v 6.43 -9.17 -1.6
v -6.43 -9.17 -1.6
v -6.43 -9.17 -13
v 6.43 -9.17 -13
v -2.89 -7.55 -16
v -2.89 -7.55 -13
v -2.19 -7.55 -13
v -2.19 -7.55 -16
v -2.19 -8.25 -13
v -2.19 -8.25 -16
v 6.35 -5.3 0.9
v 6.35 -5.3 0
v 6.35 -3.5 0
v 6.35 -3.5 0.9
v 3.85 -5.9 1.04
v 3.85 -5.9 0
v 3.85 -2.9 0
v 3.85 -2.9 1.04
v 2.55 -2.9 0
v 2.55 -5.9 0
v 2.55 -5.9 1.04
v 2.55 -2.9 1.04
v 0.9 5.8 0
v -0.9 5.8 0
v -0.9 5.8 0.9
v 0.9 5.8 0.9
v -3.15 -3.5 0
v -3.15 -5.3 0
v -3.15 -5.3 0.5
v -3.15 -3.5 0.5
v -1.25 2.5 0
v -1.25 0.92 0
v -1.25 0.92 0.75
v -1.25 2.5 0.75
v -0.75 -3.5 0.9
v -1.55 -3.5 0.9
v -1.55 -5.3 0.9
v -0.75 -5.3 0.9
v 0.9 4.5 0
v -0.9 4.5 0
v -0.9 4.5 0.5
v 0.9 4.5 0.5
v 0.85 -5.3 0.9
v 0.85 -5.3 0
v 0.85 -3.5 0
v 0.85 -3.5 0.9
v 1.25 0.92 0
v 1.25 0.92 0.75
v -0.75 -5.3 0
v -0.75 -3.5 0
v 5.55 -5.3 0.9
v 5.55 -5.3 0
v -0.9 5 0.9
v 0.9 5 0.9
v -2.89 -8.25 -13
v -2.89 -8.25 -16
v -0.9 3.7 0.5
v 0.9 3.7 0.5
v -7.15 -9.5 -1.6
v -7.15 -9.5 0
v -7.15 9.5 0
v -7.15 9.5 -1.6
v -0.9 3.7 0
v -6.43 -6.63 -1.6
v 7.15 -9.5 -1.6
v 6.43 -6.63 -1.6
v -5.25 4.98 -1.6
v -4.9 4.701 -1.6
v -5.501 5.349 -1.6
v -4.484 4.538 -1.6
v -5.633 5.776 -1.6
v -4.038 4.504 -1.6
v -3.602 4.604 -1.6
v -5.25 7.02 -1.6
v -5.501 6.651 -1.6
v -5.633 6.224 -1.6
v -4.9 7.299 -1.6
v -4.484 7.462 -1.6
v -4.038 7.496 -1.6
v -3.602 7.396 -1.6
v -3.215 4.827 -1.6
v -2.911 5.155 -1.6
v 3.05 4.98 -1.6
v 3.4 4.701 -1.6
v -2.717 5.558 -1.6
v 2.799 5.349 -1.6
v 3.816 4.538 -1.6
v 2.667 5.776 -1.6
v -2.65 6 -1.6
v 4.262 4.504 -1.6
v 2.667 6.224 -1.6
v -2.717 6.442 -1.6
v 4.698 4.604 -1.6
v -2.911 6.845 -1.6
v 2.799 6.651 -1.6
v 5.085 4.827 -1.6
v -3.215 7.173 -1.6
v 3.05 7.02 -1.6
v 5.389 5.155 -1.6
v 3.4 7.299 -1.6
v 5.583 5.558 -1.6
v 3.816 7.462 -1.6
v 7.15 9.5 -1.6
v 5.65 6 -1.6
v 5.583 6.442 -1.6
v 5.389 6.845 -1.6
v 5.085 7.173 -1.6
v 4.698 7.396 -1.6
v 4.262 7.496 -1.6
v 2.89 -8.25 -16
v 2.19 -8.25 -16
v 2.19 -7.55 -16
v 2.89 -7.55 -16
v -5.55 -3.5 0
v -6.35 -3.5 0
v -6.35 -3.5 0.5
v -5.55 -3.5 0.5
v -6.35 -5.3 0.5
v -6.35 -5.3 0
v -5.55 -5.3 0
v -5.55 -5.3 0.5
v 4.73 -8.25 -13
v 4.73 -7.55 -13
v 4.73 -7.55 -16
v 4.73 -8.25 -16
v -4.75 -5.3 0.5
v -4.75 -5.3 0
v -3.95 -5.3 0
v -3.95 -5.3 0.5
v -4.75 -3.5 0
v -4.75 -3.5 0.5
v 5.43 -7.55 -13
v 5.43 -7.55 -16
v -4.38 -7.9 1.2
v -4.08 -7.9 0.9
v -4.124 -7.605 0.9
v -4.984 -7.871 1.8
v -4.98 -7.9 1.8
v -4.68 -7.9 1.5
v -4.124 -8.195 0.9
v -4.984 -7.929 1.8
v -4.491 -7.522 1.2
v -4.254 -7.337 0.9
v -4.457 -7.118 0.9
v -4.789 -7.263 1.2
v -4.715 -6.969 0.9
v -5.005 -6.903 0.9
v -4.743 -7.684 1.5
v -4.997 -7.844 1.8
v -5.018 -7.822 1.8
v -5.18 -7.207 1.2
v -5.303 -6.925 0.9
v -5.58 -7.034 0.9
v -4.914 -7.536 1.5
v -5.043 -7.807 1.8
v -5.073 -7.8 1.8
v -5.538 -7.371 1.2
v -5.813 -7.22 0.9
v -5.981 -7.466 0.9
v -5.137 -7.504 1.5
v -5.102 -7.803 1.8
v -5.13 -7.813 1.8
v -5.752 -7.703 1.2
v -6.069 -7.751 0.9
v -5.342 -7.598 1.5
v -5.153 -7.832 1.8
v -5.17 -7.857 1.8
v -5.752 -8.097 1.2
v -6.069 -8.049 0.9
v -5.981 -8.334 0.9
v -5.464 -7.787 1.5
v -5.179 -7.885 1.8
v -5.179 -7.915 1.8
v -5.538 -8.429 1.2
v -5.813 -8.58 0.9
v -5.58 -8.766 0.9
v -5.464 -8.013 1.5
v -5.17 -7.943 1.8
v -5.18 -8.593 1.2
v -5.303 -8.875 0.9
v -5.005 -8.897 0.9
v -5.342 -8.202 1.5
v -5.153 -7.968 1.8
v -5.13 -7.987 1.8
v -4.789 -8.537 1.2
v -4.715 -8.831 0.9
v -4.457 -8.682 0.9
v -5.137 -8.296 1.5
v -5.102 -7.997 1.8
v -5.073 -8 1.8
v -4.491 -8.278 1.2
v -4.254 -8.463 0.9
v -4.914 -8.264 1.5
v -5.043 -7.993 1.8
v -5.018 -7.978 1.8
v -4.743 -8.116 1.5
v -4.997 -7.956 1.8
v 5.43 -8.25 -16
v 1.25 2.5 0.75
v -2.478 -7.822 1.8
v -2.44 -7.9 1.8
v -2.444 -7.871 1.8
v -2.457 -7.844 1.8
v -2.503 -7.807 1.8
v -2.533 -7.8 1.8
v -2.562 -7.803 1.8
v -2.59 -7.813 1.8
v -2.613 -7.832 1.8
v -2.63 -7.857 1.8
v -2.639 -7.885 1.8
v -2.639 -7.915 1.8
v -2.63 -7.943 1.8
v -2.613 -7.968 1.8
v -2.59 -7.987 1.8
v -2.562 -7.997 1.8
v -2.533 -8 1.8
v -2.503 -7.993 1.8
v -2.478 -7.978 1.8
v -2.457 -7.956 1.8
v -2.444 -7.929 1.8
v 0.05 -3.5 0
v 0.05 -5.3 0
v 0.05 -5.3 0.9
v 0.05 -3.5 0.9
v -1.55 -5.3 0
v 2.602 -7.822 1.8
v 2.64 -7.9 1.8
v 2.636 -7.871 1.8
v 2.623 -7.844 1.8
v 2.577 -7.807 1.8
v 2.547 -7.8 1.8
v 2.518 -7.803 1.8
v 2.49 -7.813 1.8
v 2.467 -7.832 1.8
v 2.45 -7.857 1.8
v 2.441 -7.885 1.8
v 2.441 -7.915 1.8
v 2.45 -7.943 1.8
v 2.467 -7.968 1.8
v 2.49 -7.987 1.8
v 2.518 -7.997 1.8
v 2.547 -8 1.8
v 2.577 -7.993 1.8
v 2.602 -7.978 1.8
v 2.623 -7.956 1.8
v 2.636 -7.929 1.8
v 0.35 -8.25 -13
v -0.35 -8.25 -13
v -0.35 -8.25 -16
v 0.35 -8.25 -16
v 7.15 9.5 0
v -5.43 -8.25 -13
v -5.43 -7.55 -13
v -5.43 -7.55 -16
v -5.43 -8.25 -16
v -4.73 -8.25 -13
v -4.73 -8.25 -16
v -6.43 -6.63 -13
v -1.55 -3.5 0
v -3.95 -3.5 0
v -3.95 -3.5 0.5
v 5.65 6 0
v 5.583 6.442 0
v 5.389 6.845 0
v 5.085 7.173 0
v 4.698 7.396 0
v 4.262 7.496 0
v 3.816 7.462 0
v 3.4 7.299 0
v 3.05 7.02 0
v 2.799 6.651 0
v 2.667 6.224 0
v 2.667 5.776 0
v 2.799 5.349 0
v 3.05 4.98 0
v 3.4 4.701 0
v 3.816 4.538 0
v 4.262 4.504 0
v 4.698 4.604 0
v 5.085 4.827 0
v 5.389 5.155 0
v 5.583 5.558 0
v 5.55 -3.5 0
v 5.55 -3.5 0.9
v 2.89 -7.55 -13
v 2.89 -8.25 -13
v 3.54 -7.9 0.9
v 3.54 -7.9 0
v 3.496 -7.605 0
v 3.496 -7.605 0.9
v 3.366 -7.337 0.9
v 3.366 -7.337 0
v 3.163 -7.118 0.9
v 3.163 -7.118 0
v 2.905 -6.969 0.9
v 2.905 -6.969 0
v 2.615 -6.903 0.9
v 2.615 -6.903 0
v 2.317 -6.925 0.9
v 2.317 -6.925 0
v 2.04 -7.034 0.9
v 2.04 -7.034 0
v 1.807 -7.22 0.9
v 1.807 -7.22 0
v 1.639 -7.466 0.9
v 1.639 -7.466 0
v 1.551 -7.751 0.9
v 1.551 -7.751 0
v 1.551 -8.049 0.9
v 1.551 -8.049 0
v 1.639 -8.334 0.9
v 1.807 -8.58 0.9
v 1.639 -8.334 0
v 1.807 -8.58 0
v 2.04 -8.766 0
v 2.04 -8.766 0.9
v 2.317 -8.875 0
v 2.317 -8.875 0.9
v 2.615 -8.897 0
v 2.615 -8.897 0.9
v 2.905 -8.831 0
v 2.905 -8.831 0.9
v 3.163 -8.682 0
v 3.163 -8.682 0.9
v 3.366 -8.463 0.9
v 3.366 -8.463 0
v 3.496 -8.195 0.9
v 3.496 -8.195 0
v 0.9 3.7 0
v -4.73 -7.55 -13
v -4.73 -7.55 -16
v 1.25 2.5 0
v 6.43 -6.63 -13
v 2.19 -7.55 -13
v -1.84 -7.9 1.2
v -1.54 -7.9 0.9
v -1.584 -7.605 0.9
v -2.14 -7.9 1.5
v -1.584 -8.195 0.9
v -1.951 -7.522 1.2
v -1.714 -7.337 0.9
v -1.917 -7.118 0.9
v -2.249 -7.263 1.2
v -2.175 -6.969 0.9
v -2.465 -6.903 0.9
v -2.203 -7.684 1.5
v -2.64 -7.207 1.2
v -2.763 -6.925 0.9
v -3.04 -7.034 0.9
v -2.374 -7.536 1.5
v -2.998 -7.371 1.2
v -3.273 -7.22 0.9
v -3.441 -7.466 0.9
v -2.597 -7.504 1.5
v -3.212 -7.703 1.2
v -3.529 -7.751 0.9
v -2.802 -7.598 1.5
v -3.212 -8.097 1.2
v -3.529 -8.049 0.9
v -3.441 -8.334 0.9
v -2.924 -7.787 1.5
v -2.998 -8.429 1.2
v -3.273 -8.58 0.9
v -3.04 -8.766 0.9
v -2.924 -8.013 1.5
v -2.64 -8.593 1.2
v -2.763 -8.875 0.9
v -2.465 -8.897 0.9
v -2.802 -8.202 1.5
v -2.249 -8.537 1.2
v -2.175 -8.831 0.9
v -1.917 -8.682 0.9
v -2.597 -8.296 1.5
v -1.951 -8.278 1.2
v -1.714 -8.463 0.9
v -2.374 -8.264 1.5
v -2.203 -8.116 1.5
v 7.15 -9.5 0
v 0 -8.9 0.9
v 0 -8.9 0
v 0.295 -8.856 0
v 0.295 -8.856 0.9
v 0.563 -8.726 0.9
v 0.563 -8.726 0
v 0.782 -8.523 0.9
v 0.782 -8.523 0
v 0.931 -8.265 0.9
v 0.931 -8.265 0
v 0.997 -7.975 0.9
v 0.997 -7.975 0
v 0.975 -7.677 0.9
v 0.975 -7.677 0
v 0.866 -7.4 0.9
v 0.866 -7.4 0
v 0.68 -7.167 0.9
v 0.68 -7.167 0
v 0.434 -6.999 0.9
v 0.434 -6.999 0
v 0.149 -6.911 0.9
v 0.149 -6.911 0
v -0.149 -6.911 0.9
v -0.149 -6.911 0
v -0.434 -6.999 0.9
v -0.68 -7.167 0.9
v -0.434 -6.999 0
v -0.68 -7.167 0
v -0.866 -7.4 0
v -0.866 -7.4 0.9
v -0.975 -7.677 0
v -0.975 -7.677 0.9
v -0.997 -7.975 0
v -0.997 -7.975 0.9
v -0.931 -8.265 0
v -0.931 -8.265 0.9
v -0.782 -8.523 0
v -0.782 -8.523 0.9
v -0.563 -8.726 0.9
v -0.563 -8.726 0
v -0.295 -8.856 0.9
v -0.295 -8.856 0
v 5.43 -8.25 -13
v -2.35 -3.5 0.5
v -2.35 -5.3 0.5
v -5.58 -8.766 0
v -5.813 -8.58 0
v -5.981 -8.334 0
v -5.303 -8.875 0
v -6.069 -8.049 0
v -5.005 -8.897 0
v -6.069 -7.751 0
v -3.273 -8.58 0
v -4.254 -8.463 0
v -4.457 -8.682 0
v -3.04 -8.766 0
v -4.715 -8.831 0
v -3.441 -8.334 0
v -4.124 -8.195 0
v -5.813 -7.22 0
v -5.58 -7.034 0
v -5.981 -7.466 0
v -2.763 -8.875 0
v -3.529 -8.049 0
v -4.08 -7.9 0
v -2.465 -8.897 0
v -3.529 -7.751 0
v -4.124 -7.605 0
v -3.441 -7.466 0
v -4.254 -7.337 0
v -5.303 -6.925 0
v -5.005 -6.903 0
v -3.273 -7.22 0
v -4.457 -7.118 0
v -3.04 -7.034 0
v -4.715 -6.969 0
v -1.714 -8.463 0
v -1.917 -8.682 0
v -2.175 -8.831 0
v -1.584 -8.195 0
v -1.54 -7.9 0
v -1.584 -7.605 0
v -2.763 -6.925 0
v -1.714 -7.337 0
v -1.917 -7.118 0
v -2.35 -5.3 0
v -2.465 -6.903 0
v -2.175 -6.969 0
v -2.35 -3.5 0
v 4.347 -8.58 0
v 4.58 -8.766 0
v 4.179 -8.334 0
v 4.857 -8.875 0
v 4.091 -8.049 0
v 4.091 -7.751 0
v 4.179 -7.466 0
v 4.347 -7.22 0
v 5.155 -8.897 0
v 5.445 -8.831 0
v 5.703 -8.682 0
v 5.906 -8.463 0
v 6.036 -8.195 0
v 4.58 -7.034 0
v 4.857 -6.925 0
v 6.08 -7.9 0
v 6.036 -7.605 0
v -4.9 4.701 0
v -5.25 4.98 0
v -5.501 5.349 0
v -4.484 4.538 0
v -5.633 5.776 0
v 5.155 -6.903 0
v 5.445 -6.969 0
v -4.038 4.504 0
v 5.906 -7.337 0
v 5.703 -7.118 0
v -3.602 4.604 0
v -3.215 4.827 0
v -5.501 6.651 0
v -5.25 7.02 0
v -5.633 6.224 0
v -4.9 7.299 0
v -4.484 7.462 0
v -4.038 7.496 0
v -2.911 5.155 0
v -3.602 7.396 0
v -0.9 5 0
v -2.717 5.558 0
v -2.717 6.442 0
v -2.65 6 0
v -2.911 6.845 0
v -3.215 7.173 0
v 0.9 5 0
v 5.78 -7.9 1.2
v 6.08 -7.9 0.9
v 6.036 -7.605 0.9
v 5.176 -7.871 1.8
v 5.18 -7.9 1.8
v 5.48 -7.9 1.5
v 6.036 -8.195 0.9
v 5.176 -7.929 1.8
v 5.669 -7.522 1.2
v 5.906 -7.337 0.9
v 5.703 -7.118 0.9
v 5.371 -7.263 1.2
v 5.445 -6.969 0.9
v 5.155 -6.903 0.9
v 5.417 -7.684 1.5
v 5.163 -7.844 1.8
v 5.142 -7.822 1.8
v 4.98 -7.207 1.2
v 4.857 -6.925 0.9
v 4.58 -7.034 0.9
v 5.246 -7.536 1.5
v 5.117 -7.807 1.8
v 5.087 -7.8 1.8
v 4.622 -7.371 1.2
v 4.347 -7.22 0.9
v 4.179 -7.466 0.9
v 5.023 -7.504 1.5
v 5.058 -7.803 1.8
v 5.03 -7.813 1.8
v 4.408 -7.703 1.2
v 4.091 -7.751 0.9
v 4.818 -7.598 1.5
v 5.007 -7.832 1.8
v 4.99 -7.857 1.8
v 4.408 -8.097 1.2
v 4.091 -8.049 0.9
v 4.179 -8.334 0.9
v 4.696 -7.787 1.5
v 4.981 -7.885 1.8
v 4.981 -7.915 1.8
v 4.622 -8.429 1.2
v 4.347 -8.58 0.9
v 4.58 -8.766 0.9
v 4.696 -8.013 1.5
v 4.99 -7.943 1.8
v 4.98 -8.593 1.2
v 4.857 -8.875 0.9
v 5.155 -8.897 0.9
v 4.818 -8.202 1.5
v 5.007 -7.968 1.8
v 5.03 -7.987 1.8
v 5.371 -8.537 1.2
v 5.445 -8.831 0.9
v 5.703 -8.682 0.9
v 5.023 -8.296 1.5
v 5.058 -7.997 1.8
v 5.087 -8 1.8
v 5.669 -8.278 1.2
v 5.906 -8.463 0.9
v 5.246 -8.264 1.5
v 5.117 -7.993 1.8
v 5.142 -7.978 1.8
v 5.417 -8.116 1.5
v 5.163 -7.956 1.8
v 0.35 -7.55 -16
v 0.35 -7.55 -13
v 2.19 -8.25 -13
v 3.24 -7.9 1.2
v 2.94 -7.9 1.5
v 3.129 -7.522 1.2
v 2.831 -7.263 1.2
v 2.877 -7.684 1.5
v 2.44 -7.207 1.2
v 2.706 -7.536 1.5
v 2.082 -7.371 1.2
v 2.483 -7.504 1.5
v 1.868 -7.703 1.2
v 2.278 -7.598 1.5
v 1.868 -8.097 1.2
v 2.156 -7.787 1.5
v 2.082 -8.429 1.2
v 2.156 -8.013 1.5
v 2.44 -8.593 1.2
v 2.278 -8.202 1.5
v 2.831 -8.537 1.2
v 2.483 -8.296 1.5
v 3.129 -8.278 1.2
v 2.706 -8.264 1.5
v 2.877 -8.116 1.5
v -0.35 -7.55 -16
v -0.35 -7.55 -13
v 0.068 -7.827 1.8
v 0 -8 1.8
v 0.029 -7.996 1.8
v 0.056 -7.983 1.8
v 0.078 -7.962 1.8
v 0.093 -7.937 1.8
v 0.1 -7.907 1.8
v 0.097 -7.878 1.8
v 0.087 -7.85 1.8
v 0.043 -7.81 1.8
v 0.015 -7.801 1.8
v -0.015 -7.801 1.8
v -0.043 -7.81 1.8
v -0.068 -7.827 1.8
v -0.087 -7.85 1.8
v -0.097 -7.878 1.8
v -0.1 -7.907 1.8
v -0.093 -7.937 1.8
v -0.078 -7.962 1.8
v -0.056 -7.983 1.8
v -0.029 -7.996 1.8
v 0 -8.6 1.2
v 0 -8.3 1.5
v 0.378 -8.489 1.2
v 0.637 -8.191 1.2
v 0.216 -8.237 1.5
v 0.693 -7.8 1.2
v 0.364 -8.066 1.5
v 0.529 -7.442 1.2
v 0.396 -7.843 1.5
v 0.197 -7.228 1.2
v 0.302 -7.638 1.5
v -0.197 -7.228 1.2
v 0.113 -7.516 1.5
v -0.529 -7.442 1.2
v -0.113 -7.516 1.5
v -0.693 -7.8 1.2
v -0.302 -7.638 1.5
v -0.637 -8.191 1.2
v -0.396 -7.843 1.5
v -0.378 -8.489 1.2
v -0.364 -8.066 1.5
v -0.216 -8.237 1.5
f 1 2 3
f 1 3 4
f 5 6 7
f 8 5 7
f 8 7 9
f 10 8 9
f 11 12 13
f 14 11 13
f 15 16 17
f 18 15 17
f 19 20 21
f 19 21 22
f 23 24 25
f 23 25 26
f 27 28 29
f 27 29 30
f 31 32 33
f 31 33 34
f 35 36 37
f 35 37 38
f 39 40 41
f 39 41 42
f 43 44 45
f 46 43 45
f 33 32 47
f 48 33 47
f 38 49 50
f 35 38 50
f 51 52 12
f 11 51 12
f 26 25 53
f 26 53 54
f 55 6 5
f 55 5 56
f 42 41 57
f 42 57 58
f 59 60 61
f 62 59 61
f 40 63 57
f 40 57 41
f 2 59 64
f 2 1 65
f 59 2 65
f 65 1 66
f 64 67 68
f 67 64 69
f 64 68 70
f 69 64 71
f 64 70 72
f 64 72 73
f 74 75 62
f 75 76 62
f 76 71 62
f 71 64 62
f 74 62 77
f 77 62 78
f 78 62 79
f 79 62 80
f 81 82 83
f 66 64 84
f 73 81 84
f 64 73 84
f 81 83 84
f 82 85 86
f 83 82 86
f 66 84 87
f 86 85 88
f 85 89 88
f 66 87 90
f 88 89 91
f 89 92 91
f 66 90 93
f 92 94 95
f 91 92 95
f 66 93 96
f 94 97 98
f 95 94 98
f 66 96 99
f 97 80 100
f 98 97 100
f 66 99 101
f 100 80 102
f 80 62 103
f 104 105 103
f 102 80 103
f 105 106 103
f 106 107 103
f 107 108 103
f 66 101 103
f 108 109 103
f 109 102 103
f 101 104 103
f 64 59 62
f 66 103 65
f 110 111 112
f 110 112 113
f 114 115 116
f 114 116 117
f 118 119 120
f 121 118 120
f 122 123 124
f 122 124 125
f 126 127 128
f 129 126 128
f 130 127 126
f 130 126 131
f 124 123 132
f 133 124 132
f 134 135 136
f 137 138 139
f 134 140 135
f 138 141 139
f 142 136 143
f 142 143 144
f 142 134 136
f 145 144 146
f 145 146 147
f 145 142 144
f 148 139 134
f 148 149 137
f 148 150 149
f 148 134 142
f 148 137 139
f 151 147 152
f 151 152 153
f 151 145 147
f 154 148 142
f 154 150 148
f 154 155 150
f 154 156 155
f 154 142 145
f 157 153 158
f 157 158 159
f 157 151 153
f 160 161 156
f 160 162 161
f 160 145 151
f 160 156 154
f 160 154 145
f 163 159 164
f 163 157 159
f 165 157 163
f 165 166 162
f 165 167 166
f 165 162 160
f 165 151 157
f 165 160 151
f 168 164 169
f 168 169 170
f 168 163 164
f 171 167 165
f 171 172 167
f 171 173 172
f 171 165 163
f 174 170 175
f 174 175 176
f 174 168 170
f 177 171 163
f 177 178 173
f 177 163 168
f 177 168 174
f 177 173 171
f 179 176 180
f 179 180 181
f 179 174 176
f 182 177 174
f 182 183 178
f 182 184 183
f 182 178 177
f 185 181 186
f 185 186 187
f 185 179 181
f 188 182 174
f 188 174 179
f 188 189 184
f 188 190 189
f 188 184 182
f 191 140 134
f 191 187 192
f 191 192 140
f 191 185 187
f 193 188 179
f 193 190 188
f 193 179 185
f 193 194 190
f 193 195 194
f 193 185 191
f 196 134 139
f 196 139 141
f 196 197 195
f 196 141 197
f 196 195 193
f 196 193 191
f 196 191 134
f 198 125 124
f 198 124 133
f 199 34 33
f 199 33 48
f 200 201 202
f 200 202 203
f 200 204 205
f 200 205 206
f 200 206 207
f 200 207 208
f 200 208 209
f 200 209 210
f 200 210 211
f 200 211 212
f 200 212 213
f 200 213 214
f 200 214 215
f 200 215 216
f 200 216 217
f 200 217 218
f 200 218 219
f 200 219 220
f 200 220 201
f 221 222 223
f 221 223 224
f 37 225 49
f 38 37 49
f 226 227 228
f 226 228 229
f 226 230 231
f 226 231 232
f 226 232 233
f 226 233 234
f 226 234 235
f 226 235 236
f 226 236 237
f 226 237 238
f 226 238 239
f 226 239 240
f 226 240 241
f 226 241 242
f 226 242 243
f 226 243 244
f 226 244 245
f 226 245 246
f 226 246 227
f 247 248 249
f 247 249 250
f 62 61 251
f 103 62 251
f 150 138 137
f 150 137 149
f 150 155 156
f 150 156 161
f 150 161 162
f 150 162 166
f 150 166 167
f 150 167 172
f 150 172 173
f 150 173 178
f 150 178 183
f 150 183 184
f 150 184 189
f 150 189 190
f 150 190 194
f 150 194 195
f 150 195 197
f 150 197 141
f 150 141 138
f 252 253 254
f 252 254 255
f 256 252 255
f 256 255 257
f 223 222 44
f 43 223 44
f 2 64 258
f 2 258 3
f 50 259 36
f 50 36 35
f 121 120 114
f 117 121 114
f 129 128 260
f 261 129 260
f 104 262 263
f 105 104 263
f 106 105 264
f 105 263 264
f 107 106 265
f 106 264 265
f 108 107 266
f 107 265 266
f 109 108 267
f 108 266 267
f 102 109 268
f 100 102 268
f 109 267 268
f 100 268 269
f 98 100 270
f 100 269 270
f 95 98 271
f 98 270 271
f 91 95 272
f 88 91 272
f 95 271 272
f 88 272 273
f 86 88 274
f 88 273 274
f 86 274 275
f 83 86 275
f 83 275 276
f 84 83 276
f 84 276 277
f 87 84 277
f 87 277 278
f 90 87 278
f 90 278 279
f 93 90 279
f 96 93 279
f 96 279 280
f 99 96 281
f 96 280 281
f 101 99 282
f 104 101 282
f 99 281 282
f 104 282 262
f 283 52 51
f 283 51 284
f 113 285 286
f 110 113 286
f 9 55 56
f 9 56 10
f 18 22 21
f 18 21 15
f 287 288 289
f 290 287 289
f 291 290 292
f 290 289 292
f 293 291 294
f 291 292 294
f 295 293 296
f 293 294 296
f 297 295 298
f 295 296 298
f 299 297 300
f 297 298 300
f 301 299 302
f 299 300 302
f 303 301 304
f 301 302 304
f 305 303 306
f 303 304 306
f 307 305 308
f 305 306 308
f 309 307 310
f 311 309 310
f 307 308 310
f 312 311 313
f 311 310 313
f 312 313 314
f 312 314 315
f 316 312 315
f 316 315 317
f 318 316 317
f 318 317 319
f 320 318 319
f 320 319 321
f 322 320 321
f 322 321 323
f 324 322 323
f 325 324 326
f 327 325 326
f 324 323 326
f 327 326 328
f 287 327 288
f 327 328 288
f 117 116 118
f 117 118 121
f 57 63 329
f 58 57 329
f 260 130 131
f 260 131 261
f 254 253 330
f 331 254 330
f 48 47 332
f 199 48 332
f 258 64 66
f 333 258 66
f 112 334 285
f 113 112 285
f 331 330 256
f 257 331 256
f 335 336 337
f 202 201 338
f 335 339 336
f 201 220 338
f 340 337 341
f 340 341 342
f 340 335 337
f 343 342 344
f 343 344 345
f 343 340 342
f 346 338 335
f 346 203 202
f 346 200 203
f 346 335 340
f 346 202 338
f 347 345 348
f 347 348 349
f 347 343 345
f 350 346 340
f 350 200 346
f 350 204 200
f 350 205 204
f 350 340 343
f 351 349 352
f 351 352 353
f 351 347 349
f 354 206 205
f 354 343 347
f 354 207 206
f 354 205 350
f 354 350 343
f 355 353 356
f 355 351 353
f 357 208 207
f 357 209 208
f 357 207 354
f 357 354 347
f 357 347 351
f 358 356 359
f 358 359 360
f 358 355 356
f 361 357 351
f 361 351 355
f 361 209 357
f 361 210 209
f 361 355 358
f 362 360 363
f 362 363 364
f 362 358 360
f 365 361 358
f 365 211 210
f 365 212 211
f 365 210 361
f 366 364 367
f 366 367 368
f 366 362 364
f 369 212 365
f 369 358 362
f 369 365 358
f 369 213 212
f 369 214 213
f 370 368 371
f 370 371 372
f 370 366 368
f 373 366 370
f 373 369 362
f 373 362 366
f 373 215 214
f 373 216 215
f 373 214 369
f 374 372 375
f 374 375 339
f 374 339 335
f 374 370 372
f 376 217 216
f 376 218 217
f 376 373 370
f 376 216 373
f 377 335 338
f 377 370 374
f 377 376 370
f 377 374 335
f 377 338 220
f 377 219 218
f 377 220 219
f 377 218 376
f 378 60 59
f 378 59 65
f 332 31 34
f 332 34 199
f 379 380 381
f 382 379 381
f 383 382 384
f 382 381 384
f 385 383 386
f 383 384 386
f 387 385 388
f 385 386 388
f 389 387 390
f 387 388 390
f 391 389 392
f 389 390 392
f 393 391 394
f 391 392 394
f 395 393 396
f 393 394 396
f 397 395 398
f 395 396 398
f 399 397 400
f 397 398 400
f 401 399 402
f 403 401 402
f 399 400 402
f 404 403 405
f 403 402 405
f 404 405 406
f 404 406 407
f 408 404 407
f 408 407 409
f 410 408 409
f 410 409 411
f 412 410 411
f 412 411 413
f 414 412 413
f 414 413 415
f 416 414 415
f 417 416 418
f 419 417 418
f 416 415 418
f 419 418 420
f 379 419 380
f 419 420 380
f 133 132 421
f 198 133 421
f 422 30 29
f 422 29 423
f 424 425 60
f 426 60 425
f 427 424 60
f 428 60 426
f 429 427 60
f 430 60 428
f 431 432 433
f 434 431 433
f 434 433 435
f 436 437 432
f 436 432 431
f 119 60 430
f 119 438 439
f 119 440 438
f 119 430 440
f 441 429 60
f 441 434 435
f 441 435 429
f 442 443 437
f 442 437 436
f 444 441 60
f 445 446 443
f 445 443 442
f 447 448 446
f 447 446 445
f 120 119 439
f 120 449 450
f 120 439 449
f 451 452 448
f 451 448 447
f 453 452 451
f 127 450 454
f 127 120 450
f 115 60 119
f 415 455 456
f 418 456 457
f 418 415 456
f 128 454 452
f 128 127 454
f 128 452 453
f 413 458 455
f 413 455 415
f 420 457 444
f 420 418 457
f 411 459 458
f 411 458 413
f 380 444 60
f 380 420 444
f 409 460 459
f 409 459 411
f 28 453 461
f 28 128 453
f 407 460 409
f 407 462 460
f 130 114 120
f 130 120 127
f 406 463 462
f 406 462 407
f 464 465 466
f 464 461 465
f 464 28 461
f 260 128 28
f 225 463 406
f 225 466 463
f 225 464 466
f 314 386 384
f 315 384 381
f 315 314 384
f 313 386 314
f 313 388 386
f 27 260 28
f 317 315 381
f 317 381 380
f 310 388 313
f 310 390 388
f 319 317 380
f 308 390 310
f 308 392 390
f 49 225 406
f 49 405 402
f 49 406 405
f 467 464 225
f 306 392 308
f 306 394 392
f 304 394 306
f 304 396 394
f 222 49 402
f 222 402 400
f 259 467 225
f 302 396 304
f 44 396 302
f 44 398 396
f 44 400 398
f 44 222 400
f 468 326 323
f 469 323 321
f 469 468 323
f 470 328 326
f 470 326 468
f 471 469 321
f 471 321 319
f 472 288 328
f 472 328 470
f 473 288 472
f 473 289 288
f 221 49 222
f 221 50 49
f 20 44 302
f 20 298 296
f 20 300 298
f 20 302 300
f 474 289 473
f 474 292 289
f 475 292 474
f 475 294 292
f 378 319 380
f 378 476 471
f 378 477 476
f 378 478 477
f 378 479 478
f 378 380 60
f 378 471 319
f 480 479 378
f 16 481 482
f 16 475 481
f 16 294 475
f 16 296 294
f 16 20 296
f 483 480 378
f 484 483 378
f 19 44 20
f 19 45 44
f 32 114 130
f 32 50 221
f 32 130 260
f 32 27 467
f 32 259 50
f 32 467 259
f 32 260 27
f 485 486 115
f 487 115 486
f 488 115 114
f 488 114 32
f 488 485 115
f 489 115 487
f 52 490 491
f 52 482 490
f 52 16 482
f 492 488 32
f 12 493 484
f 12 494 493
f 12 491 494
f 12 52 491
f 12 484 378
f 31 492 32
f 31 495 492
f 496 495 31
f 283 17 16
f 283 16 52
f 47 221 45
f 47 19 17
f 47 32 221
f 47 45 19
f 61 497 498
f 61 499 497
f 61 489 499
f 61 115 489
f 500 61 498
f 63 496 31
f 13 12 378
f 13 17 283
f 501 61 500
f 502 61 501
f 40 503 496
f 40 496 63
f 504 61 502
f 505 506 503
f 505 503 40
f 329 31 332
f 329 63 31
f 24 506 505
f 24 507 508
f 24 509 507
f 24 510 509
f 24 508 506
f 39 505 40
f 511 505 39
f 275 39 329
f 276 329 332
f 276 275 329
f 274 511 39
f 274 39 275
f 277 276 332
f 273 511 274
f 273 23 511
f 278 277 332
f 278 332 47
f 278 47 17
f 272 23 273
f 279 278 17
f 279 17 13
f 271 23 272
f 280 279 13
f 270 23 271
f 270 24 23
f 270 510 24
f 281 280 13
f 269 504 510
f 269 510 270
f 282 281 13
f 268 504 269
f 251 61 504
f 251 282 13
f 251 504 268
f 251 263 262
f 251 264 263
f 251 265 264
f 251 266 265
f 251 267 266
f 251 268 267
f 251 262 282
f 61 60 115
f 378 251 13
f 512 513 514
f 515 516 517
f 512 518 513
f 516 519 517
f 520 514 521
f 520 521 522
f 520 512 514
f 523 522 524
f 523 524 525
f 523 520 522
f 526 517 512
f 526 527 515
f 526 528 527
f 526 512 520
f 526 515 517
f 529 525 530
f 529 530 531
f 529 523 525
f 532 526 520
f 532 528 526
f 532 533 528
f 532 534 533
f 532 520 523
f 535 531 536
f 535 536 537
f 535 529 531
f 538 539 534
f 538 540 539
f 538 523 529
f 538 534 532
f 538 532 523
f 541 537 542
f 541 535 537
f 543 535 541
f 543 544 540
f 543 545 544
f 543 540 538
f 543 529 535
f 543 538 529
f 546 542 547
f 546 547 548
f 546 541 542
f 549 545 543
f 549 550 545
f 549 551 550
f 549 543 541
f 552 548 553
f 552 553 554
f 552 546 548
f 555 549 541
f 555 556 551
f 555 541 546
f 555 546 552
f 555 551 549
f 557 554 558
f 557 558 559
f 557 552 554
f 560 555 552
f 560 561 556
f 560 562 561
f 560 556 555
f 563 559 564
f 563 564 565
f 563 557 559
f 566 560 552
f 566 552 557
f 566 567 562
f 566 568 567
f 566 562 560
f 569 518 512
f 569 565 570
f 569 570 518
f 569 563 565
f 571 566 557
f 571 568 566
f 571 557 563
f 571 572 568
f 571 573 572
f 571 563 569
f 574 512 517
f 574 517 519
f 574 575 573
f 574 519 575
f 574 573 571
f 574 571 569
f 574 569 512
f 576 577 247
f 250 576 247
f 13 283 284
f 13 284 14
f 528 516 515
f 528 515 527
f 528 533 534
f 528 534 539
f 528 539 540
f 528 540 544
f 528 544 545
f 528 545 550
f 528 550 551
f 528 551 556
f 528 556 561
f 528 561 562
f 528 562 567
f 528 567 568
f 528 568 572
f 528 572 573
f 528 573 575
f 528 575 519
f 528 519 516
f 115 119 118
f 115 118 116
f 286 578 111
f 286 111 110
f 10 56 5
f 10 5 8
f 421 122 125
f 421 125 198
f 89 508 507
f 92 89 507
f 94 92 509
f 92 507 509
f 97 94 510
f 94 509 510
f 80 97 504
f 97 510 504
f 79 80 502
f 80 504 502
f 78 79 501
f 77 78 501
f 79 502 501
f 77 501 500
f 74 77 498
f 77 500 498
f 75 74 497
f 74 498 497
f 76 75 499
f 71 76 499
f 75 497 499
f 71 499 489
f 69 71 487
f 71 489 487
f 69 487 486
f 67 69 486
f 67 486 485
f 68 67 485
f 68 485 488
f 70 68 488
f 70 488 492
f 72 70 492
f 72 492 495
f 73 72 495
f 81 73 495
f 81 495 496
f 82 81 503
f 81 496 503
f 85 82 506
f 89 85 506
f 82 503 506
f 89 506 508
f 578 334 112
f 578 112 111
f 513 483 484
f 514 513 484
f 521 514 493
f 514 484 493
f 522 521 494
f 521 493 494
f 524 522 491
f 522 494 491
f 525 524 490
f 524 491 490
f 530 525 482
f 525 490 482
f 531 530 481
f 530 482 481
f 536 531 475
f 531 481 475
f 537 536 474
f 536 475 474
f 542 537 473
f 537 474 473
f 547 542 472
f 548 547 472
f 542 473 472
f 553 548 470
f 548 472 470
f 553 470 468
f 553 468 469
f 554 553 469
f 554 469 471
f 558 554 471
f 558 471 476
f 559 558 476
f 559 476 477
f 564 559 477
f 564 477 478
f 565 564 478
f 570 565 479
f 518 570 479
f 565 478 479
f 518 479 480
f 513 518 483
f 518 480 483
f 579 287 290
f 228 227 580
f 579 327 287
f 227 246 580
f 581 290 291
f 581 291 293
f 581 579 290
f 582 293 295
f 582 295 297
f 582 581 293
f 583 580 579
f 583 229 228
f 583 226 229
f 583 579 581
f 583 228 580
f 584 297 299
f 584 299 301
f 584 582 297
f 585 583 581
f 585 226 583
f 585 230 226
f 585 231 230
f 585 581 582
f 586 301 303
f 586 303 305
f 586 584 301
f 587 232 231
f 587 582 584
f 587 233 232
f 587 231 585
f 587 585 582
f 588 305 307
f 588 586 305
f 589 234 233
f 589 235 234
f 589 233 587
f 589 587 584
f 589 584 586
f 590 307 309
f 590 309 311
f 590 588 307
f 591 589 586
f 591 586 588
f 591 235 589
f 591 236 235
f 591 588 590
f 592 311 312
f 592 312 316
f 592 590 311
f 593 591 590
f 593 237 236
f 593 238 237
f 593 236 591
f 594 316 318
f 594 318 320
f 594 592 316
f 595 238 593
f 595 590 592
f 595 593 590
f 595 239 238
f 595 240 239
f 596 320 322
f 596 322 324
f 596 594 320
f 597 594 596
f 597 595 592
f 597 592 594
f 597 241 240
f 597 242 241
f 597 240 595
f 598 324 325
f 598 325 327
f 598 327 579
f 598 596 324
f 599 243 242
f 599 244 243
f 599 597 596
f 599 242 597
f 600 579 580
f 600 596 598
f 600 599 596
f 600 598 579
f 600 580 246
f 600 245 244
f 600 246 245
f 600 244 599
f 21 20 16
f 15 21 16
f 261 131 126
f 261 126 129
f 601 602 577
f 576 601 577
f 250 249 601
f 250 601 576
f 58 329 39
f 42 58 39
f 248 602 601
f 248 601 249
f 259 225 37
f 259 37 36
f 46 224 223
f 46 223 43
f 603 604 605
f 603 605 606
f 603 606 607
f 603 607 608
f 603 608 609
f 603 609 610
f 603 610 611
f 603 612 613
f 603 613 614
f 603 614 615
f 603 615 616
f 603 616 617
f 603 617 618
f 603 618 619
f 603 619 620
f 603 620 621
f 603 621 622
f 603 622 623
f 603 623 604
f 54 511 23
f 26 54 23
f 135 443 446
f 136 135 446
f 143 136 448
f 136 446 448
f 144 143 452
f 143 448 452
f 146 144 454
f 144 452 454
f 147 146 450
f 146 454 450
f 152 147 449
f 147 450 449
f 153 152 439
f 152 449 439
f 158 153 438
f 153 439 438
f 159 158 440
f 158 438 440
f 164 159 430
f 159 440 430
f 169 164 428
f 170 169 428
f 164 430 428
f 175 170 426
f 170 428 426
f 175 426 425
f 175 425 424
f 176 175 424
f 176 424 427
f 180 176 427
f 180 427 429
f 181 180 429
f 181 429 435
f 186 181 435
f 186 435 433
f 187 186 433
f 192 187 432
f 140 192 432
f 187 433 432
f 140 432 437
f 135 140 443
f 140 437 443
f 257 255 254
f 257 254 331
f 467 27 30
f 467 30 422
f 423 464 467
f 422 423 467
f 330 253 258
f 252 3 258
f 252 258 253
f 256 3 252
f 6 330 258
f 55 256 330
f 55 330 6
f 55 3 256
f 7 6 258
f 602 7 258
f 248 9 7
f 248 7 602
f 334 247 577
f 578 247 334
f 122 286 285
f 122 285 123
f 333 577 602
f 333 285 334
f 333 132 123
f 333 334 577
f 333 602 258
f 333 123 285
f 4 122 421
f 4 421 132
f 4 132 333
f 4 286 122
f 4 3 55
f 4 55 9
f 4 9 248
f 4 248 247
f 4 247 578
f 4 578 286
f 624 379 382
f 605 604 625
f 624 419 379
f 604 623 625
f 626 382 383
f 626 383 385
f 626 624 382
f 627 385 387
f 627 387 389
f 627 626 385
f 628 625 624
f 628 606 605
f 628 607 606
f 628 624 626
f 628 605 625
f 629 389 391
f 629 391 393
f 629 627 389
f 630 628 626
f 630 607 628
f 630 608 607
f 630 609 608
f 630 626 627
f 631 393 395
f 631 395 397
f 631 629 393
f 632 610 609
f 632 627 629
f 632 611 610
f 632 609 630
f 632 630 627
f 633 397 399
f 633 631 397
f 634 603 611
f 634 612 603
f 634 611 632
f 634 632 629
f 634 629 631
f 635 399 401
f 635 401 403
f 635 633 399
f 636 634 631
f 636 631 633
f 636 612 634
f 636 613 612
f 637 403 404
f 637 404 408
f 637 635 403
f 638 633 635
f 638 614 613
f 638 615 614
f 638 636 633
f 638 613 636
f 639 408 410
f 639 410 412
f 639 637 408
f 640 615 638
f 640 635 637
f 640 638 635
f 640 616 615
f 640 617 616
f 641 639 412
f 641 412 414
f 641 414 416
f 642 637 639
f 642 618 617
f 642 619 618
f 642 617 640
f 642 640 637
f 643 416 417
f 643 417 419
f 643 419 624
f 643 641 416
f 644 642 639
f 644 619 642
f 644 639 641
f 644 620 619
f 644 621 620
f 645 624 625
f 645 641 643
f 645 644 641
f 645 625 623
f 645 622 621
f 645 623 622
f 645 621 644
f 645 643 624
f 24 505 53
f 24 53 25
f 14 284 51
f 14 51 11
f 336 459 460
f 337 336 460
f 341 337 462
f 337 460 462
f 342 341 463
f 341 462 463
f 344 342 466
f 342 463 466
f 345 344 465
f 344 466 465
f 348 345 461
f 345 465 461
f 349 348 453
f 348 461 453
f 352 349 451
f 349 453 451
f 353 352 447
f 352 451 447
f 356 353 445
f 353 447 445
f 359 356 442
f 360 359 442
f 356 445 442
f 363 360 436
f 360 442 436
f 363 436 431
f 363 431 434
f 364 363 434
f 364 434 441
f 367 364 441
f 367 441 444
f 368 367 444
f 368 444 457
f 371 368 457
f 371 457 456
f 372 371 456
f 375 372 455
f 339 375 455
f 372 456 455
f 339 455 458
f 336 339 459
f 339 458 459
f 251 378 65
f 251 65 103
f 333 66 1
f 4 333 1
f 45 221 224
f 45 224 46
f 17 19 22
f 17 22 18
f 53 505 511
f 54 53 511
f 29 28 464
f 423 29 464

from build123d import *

# Parameters (mm, degrees)
F0_W      = 14.3
F0_H      = 19
F0_R      = 1
F0_W_2    = 0.8
F0_H_2    = 1.8
F0_W_3    = 1.3
F0_H_3    = 3
F0_W_4    = 2.5
F0_H_4    = 1.58
F0_W_5    = 1.8
F0_H_5    = 0.8
F0_R_2    = 1.5
F1_DEPTH  = 1.6
F2_DEPTH  = 0.75
F3_DEPTH  = 0.9
F4_DEPTH  = 0.5
F5_DEPTH  = 1.04
F6_DEPTH  = 1.8
F7_SIZE2  = 0.9
F7_SIZE   = 0.9
F8_W      = 0.7
F8_H      = 0.7
F9_DEPTH  = 14.4
F8_W_2    = 12.86
F8_H_2    = 2.54
F10_DEPTH = 11.4


with BuildPart() as f1:
    # F0 (on Top) → F1 (new body)
    with BuildSketch(Plane.XY):
        Rectangle(F0_W, F0_H)
        with Locations((-5.08, -7.9)):
            Circle(F0_R, mode=Mode.SUBTRACT)
        with Locations((-2.54, -7.9)):
            Circle(F0_R, mode=Mode.SUBTRACT)
        with BuildLine():
            ThreePointArc((0, -6.9), (1, -7.9), (0, -8.9))
            ThreePointArc((0, -8.9), (-1, -7.9), (0, -6.9))
        make_face(mode=Mode.SUBTRACT)
        with Locations((-5.95, -4.4)):
            Rectangle(F0_W_2, F0_H_2, mode=Mode.SUBTRACT)
        with Locations((-4.35, -4.4)):
            Rectangle(F0_W_2, F0_H_2, mode=Mode.SUBTRACT)
        with Locations((-2.75, -4.4)):
            Rectangle(F0_W_2, F0_H_2, mode=Mode.SUBTRACT)
        with Locations((-1.15, -4.4)):
            Rectangle(F0_W_2, F0_H_2, mode=Mode.SUBTRACT)
        with Locations((2.54, -7.9)):
            Circle(F0_R, mode=Mode.SUBTRACT)
        with Locations((5.08, -7.9)):
            Circle(F0_R, mode=Mode.SUBTRACT)
        with Locations((0.45, -4.4)):
            Rectangle(F0_W_2, F0_H_2, mode=Mode.SUBTRACT)
        with Locations((3.2, -4.4)):
            Rectangle(F0_W_3, F0_H_3, mode=Mode.SUBTRACT)
        with Locations((5.95, -4.4)):
            Rectangle(F0_W_2, F0_H_2, mode=Mode.SUBTRACT)
        with Locations((0, 1.71)):
            Rectangle(F0_W_4, F0_H_4, mode=Mode.SUBTRACT)
        with Locations((0, 4.1)):
            Rectangle(F0_W_5, F0_H_5, mode=Mode.SUBTRACT)
        with Locations((-4.15, 6)):
            Circle(F0_R_2, mode=Mode.SUBTRACT)
        with Locations((0, 5.4)):
            Rectangle(F0_W_5, F0_H_5, mode=Mode.SUBTRACT)
        with Locations((4.15, 6)):
            Circle(F0_R_2, mode=Mode.SUBTRACT)
        with Locations((0, 1.71)):
            Rectangle(F0_W_4, F0_H_4)
        with Locations((5.95, -4.4)):
            Rectangle(F0_W_2, F0_H_2)
        with Locations((3.2, -4.4)):
            Rectangle(F0_W_3, F0_H_3)
        with Locations((0.45, -4.4)):
            Rectangle(F0_W_2, F0_H_2)
        with Locations((-1.15, -4.4)):
            Rectangle(F0_W_2, F0_H_2)
        with Locations((-2.75, -4.4)):
            Rectangle(F0_W_2, F0_H_2)
        with Locations((-4.35, -4.4)):
            Rectangle(F0_W_2, F0_H_2)
        with Locations((-5.95, -4.4)):
            Rectangle(F0_W_2, F0_H_2)
        with Locations((0, 4.1)):
            Rectangle(F0_W_5, F0_H_5)
        with Locations((0, 5.4)):
            Rectangle(F0_W_5, F0_H_5)
        with Locations((-5.08, -7.9)):
            Circle(F0_R)
        with Locations((-2.54, -7.9)):
            Circle(F0_R)
        with BuildLine():
            ThreePointArc((0, -6.9), (-1, -7.9), (0, -8.9))
            ThreePointArc((0, -8.9), (1, -7.9), (0, -6.9))
        make_face()
        with Locations((2.54, -7.9)):
            Circle(F0_R)
        with Locations((5.08, -7.9)):
            Circle(F0_R)
    extrude(amount=-F1_DEPTH)

    # F0 (on Top) → F2 (join)
    with BuildSketch(Plane.XY):
        with Locations((0, 1.71)):
            Rectangle(F0_W_4, F0_H_4)
    extrude(amount=F2_DEPTH)

    # F0 (on Top) → F3 (join)
    with BuildSketch(Plane.XY):
        with Locations((0, 5.4)):
            Rectangle(F0_W_5, F0_H_5)
        with Locations((5.95, -4.4)):
            Rectangle(F0_W_2, F0_H_2)
        with Locations((0.45, -4.4)):
            Rectangle(F0_W_2, F0_H_2)
        with Locations((-1.15, -4.4)):
            Rectangle(F0_W_2, F0_H_2)
    extrude(amount=F3_DEPTH)

    # F0 (on Top) → F4 (join)
    with BuildSketch(Plane.XY):
        with Locations((0, 4.1)):
            Rectangle(F0_W_5, F0_H_5)
        with Locations((-2.75, -4.4)):
            Rectangle(F0_W_2, F0_H_2)
        with Locations((-4.35, -4.4)):
            Rectangle(F0_W_2, F0_H_2)
        with Locations((-5.95, -4.4)):
            Rectangle(F0_W_2, F0_H_2)
    extrude(amount=F4_DEPTH)

    # F0 (on Top) → F5 (join)
    with BuildSketch(Plane.XY):
        with Locations((3.2, -4.4)):
            Rectangle(F0_W_3, F0_H_3)
    extrude(amount=F5_DEPTH)

    # F0 (on Top) → F6 (join)
    with BuildSketch(Plane.XY):
        with Locations((-5.08, -7.9)):
            Circle(F0_R)
        with Locations((-2.54, -7.9)):
            Circle(F0_R)
        with BuildLine():
            ThreePointArc((0, -6.9), (-1, -7.9), (0, -8.9))
            ThreePointArc((0, -8.9), (1, -7.9), (0, -6.9))
        make_face()
        with Locations((2.54, -7.9)):
            Circle(F0_R)
        with Locations((5.08, -7.9)):
            Circle(F0_R)
    extrude(amount=F6_DEPTH)

    # F7
    f7_edges = [f1.edges().sort_by_distance(p)[0] for p in [
        (-6.08, -7.9, 1.8),
        (-3.54, -7.9, 1.8),
        (0, -6.9, 1.8),
        (1.54, -7.9, 1.8),
        (4.08, -7.9, 1.8),
    ]]
    chamfer(f7_edges, length=F7_SIZE, length2=F7_SIZE2)

    # F8 (on face) → F9 (join)
    with BuildSketch(Plane(origin=(0, 0, -1.6), x_dir=(1, 0, 0), z_dir=(0, 0, -1))):
        with Locations((-5.08, 7.9)):
            Rectangle(F8_W, F8_H)
        with Locations((-2.54, 7.9)):
            Rectangle(F8_W, F8_H)
        with Locations((0, 7.9)):
            Rectangle(F8_W, F8_H)
        with Locations((2.54, 7.9)):
            Rectangle(F8_W, F8_H)
        with Locations((5.08, 7.9)):
            Rectangle(F8_W, F8_H)
    extrude(amount=F9_DEPTH)

    # F8 (on face) → F10 (join)
    with BuildSketch(Plane(origin=(0, 0, -1.6), x_dir=(1, 0, 0), z_dir=(0, 0, -1))):
        with Locations((0, 7.9)):
            Rectangle(F8_W_2, F8_H_2)
        with Locations((-5.08, 7.9)):
            Rectangle(F8_W, F8_H, mode=Mode.SUBTRACT)
        with Locations((-2.54, 7.9)):
            Rectangle(F8_W, F8_H, mode=Mode.SUBTRACT)
        with Locations((0, 7.9)):
            Rectangle(F8_W, F8_H, mode=Mode.SUBTRACT)
        with Locations((2.54, 7.9)):
            Rectangle(F8_W, F8_H, mode=Mode.SUBTRACT)
        with Locations((5.08, 7.9)):
            Rectangle(F8_W, F8_H, mode=Mode.SUBTRACT)
    extrude(amount=F10_DEPTH)


solid = f1.part
